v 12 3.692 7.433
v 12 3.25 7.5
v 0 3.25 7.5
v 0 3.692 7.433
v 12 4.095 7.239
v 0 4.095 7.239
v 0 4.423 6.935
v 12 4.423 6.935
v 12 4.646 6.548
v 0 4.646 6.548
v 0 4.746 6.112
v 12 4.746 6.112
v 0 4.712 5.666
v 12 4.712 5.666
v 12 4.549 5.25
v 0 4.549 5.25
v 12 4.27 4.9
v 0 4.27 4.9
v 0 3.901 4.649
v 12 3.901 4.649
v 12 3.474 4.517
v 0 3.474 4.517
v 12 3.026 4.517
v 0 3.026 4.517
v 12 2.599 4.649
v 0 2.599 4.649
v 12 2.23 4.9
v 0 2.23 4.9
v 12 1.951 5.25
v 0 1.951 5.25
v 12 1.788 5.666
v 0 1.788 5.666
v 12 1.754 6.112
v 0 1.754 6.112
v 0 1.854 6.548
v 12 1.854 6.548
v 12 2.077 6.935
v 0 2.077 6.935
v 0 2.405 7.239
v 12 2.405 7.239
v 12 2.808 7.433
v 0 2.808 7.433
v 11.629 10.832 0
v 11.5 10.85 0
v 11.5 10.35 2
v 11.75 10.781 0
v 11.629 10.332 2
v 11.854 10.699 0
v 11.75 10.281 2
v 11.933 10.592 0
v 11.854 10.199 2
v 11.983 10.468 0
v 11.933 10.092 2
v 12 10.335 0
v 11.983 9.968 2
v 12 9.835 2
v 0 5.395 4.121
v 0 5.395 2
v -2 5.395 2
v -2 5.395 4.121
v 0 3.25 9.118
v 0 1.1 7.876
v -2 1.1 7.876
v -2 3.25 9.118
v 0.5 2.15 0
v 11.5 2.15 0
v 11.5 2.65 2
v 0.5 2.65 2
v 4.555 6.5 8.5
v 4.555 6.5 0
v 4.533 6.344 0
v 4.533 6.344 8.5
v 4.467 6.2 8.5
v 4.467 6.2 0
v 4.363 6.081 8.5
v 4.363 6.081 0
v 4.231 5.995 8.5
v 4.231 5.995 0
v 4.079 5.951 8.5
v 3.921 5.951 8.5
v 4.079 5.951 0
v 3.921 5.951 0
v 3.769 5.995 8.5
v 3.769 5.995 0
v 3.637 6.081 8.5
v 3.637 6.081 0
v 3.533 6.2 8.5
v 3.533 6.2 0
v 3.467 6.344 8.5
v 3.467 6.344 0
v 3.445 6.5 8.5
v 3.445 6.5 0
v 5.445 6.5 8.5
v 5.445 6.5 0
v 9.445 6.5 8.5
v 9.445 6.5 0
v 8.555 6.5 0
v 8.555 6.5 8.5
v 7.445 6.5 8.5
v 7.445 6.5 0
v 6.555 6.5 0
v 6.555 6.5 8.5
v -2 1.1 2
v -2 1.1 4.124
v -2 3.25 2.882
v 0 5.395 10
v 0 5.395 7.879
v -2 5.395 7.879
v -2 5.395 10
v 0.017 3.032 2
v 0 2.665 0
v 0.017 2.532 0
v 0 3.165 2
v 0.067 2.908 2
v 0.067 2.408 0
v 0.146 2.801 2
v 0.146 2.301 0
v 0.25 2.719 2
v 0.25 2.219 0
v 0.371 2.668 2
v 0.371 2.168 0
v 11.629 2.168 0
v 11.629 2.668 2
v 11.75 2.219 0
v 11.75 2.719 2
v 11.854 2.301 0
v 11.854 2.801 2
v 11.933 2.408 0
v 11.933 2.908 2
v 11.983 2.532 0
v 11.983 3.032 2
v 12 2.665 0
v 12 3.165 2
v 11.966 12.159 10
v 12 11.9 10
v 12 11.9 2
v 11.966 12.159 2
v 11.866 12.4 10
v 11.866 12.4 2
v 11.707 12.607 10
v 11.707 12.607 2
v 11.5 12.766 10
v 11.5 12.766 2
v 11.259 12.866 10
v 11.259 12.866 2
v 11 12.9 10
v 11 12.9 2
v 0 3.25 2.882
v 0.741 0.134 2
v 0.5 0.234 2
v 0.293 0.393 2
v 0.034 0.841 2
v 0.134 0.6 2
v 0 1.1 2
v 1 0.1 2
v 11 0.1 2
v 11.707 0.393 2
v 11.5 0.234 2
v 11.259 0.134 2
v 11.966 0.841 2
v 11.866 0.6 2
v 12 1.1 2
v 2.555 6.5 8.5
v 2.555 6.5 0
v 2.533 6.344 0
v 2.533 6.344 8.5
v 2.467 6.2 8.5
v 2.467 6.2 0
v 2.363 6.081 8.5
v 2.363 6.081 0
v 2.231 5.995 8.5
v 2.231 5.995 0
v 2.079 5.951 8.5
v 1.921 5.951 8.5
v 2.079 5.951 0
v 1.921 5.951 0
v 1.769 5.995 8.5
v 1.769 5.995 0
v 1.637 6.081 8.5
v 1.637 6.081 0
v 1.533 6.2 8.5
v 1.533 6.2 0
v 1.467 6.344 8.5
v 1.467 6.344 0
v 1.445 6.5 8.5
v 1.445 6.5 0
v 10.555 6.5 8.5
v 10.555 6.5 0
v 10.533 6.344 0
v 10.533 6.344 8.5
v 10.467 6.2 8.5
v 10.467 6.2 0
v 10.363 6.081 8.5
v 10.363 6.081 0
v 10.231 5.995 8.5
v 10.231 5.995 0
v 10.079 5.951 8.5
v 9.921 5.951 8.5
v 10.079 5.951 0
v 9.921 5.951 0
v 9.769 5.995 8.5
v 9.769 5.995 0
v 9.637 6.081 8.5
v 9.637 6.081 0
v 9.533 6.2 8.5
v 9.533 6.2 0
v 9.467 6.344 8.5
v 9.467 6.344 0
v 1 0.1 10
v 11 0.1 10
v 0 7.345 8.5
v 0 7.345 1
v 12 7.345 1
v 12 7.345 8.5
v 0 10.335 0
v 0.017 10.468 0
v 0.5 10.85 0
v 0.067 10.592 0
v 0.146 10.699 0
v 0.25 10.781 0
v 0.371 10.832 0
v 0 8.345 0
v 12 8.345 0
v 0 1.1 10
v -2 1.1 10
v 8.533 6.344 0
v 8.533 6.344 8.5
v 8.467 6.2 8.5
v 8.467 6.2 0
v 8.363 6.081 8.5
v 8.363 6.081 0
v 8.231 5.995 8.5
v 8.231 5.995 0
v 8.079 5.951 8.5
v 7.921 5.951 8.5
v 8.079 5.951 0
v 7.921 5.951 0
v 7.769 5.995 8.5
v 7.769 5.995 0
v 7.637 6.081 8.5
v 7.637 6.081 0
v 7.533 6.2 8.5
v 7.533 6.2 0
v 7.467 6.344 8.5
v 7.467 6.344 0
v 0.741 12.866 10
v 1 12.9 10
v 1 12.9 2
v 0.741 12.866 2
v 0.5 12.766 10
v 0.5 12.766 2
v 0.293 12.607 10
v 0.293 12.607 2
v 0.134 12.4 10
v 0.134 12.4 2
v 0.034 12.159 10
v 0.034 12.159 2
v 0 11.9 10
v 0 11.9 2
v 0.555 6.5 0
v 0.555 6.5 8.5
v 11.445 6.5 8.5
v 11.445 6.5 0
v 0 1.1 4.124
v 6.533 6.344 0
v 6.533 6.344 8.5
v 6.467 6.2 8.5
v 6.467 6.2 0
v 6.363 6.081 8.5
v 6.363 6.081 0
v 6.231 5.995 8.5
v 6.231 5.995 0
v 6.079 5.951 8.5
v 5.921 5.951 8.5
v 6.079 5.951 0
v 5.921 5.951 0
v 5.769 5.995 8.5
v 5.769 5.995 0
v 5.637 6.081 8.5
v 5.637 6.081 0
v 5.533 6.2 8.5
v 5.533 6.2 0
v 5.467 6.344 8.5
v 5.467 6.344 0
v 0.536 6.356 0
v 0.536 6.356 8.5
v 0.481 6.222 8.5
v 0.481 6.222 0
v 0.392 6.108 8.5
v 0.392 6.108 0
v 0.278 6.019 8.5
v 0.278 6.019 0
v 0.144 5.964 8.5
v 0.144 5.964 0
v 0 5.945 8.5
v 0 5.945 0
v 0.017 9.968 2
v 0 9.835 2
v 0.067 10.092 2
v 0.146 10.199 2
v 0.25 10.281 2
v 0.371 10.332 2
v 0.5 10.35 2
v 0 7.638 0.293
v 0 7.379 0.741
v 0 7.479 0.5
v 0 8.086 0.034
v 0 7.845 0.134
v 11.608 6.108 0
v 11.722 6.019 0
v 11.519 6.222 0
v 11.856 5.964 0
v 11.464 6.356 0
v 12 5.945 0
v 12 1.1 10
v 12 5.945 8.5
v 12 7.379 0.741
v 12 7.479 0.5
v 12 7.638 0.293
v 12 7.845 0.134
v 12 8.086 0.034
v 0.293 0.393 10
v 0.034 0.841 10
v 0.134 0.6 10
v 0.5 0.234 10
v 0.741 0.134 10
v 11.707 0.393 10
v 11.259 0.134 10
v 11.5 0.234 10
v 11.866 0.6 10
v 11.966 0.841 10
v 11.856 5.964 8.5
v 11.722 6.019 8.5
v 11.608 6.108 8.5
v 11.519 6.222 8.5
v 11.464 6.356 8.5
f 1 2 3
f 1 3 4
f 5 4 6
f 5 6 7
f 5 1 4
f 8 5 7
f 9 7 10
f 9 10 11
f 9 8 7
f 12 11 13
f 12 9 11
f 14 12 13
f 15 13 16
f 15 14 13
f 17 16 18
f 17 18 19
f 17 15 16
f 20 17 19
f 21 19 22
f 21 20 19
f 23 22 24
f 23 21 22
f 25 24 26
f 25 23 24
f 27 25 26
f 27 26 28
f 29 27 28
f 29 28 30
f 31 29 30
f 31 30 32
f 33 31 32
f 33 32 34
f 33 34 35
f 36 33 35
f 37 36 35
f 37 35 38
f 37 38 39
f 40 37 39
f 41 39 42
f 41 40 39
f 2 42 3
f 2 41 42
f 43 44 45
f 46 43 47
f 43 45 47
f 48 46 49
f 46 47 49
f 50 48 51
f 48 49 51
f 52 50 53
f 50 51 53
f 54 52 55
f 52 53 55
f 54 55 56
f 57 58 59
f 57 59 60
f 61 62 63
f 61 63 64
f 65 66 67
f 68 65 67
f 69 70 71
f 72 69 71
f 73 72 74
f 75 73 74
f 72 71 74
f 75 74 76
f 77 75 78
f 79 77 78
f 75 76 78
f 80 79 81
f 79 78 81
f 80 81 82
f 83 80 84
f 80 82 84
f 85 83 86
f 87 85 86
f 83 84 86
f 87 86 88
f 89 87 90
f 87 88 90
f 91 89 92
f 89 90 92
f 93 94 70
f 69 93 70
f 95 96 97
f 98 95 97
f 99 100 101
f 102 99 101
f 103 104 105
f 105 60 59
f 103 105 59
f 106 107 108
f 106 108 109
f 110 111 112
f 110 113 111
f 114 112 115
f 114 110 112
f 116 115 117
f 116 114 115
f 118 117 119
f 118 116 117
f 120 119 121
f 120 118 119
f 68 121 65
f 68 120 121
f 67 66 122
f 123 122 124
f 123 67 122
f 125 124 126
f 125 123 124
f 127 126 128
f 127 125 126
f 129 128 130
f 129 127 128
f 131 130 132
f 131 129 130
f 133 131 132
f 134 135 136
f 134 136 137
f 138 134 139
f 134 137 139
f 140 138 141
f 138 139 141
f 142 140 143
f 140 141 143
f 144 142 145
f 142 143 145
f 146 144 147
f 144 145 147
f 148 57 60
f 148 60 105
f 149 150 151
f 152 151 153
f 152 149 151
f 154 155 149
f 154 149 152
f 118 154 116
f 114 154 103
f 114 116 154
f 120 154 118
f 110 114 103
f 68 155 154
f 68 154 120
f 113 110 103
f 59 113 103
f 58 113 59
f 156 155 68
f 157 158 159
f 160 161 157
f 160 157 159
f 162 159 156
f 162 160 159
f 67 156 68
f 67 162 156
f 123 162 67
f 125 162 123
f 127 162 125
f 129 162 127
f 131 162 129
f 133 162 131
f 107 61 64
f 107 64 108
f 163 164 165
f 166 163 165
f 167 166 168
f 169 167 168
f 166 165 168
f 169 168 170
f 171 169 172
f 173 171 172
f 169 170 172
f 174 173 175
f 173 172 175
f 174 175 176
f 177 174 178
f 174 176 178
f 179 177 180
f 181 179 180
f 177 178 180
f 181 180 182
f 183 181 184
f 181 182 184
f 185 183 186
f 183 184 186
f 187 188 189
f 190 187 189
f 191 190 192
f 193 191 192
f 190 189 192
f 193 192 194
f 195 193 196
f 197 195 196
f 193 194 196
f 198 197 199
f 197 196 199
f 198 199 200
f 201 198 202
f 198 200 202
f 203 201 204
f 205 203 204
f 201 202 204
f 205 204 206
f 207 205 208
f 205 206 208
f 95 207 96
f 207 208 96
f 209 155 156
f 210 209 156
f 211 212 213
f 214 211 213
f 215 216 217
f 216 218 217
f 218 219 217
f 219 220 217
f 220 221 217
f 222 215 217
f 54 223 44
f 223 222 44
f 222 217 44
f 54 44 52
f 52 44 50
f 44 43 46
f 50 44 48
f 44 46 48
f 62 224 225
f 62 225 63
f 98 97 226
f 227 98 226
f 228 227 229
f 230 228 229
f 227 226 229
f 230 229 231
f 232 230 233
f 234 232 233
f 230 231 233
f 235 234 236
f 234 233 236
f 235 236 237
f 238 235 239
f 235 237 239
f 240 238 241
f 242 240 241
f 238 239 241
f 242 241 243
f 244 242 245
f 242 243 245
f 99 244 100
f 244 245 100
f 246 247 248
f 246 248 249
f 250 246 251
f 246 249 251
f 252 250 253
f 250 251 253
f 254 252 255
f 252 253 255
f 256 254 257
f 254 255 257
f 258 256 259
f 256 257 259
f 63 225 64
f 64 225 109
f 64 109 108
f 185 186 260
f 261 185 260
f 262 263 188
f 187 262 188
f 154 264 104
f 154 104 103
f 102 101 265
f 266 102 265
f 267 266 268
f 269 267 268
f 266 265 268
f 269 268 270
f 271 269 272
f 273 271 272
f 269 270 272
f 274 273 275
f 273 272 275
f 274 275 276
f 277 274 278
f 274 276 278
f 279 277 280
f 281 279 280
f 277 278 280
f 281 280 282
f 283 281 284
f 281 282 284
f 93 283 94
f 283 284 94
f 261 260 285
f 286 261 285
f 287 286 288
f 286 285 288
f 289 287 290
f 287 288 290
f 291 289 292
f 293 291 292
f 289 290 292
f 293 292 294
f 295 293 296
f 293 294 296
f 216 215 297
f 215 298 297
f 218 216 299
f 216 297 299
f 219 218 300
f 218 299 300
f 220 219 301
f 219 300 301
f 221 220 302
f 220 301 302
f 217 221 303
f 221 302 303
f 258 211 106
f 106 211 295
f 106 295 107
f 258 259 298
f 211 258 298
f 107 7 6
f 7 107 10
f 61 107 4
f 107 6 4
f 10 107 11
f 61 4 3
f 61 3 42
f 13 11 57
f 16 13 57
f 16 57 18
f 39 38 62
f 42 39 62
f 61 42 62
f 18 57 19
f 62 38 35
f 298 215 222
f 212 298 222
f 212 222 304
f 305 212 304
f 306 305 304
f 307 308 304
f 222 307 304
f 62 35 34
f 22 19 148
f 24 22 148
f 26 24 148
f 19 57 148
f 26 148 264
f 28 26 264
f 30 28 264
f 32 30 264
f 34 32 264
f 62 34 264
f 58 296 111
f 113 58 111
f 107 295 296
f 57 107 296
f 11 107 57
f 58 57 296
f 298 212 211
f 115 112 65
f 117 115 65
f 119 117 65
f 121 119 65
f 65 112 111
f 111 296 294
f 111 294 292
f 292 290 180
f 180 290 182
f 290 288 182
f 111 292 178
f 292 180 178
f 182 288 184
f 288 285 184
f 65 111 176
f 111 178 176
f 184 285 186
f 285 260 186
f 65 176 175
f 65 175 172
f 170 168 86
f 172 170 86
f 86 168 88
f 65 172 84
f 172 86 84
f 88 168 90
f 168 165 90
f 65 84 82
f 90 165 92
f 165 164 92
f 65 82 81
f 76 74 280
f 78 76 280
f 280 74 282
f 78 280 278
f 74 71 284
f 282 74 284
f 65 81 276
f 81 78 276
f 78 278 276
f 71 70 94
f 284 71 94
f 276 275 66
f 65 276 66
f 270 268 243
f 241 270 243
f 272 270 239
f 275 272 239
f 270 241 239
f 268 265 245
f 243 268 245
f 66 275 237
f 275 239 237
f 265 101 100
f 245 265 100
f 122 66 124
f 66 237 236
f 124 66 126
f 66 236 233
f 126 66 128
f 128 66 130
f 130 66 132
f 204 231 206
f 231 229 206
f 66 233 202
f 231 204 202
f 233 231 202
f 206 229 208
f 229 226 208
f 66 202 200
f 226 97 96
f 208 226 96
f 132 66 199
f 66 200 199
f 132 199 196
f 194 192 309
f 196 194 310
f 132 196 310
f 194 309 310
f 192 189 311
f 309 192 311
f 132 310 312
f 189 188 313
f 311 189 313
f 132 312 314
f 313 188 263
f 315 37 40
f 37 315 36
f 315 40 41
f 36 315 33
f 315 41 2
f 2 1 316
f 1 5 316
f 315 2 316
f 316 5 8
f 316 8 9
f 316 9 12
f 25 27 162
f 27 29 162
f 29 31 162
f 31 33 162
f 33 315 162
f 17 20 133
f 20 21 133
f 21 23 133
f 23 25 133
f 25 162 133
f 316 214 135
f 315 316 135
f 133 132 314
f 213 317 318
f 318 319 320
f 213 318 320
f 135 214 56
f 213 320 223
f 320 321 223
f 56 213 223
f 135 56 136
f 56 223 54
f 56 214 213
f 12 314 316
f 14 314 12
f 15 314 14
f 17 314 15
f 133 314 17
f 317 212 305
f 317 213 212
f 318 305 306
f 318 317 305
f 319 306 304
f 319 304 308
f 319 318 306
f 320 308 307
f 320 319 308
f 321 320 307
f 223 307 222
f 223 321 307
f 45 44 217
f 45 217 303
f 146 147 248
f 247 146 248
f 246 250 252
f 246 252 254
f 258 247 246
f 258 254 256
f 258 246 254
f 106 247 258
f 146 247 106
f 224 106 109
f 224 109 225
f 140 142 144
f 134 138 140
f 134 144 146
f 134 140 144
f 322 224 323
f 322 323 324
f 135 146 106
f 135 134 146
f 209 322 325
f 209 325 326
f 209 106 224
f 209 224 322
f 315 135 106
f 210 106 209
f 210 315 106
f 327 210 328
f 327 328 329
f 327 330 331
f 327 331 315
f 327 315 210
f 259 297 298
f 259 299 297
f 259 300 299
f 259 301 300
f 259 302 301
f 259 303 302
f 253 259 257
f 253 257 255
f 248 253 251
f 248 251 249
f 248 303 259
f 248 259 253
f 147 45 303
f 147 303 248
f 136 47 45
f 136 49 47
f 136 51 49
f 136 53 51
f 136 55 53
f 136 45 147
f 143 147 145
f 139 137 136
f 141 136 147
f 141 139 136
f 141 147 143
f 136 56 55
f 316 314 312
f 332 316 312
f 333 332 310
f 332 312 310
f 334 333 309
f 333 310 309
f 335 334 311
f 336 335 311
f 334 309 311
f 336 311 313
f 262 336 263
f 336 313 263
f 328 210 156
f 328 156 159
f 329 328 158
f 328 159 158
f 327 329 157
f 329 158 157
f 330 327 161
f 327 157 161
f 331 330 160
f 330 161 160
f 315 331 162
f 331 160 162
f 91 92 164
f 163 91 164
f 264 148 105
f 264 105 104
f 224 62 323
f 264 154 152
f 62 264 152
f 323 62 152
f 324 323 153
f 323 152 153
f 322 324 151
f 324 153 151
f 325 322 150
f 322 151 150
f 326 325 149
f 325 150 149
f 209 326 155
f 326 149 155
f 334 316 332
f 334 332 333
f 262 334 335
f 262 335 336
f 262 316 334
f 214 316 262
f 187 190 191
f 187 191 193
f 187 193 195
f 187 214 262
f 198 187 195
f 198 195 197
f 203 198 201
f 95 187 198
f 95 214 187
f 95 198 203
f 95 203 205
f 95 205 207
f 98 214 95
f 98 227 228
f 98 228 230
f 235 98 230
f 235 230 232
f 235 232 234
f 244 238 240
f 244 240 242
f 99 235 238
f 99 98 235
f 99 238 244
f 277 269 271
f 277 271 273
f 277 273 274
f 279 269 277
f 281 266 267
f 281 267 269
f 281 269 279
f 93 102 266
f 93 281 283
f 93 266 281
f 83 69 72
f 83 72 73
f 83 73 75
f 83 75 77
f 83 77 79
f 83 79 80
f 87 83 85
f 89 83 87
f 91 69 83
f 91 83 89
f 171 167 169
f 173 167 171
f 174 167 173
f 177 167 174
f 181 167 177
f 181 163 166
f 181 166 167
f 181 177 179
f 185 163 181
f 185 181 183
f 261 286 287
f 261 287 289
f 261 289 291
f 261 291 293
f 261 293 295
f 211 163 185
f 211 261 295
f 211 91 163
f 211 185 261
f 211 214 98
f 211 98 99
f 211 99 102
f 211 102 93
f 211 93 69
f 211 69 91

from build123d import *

# Parameters (mm, degrees)
BOSS_EXTRUDE1_DEPTH = 10
CUT_EXTRUDE1_DEPTH  = 8.5
CUT_EXTRUDE2_START  = -12
SKETCH6_R           = 1.5
CUT_EXTRUDE2_DEPTH  = 12
BOSS_EXTRUDE2_DEPTH = 2
FILLET2_R           = 0.5
FILLET3_R           = 1


with BuildPart() as part:
    # Sketch4 → Boss-Extrude1 (new body)
    with BuildSketch(Plane.XY):
        with BuildLine():
            Line((1, 0.1), (11, 0.1))
            ThreePointArc((11, 0.1), (11.707106781, 0.392893219), (12, 1.1))
            Line((12, 1.1), (12, 11.9))
            ThreePointArc((12, 11.9), (11.707106781, 12.607106781), (11, 12.9))
            Line((11, 12.9), (1, 12.9))
            ThreePointArc((1, 12.9), (0.292893219, 12.607106781), (0, 11.9))
            Line((0, 11.9), (0, 1.1))
            ThreePointArc((0, 1.1), (0.292893219, 0.392893219), (1, 0.1))
        make_face()
    extrude(amount=BOSS_EXTRUDE1_DEPTH)

    # Sketch5 → Cut-Extrude1 (cut)
    with BuildSketch(Plane.XY):
        with BuildLine():
            Line((11.445, 6.5), (10.555, 6.5))
            ThreePointArc((10.555, 6.5), (10, 5.945), (9.445, 6.5))
            Line((9.445, 6.5), (8.555, 6.5))
            ThreePointArc((8.555, 6.5), (8, 5.945), (7.445, 6.5))
            Line((7.445, 6.5), (6.555, 6.5))
            ThreePointArc((6.555, 6.5), (6, 5.945), (5.445, 6.5))
            Line((5.445, 6.5), (4.555, 6.5))
            ThreePointArc((4.555, 6.5), (4, 5.945), (3.445, 6.5))
            Line((3.445, 6.5), (2.555, 6.5))
            ThreePointArc((2.555, 6.5), (2, 5.945), (1.445, 6.5))
            Line((1.445, 6.5), (0.555, 6.5))
            ThreePointArc((0.555, 6.5), (0.392444264, 6.107555736), (0, 5.945))
            Line((0, 5.945), (0, 7.345))
            Line((0, 7.345), (12, 7.345))
            Line((12, 7.345), (12, 5.945))
            ThreePointArc((12, 5.945), (11.607555736, 6.107555736), (11.445, 6.5))
        make_face()
    extrude(amount=CUT_EXTRUDE1_DEPTH, mode=Mode.SUBTRACT)

    # Sketch6 → Cut-Extrude2 (cut)
    with BuildSketch(Plane.ZY.offset(CUT_EXTRUDE2_START)):
        with Locations((6, 3.25)):
            Circle(SKETCH6_R)
        Polygon((2, 2.65), (2, 0.1), (0, 0.1), (0, 2.15), align=None)
        Polygon((0, 12.9), (0, 10.85), (2, 10.35), (2, 12.9), align=None)
    extrude(amount=CUT_EXTRUDE2_DEPTH, mode=Mode.SUBTRACT)

    # Sketch7 → Boss-Extrude2 (add)
    with BuildSketch(Plane.ZY):
        Polygon((7.876388375, 1.1), (9.117691454, 3.25), (7.879275126, 5.395), (10, 5.395), (10, 1.1), align=None)
        Polygon((2, 1.1), (2, 5.395), (4.120724874, 5.395), (2.882308546, 3.25), (4.123611625, 1.1), align=None)
    extrude(amount=BOSS_EXTRUDE2_DEPTH)

    # Fillet2
    fillet2_edges = [part.edges().sort_by_distance(p)[0] for p in [
        (12, 2.4, 1),
        (12, 10.6, 1),
        (0, 10.6, 1),
        (0, 2.4, 1),
    ]]
    fillet(fillet2_edges, radius=FILLET2_R)

    # Fillet3
    fillet3_edges = [part.edges().sort_by_distance(p)[0] for p in [
        (6, 7.345, 0),
    ]]
    fillet(fillet3_edges, radius=FILLET3_R)


solid = part.part
